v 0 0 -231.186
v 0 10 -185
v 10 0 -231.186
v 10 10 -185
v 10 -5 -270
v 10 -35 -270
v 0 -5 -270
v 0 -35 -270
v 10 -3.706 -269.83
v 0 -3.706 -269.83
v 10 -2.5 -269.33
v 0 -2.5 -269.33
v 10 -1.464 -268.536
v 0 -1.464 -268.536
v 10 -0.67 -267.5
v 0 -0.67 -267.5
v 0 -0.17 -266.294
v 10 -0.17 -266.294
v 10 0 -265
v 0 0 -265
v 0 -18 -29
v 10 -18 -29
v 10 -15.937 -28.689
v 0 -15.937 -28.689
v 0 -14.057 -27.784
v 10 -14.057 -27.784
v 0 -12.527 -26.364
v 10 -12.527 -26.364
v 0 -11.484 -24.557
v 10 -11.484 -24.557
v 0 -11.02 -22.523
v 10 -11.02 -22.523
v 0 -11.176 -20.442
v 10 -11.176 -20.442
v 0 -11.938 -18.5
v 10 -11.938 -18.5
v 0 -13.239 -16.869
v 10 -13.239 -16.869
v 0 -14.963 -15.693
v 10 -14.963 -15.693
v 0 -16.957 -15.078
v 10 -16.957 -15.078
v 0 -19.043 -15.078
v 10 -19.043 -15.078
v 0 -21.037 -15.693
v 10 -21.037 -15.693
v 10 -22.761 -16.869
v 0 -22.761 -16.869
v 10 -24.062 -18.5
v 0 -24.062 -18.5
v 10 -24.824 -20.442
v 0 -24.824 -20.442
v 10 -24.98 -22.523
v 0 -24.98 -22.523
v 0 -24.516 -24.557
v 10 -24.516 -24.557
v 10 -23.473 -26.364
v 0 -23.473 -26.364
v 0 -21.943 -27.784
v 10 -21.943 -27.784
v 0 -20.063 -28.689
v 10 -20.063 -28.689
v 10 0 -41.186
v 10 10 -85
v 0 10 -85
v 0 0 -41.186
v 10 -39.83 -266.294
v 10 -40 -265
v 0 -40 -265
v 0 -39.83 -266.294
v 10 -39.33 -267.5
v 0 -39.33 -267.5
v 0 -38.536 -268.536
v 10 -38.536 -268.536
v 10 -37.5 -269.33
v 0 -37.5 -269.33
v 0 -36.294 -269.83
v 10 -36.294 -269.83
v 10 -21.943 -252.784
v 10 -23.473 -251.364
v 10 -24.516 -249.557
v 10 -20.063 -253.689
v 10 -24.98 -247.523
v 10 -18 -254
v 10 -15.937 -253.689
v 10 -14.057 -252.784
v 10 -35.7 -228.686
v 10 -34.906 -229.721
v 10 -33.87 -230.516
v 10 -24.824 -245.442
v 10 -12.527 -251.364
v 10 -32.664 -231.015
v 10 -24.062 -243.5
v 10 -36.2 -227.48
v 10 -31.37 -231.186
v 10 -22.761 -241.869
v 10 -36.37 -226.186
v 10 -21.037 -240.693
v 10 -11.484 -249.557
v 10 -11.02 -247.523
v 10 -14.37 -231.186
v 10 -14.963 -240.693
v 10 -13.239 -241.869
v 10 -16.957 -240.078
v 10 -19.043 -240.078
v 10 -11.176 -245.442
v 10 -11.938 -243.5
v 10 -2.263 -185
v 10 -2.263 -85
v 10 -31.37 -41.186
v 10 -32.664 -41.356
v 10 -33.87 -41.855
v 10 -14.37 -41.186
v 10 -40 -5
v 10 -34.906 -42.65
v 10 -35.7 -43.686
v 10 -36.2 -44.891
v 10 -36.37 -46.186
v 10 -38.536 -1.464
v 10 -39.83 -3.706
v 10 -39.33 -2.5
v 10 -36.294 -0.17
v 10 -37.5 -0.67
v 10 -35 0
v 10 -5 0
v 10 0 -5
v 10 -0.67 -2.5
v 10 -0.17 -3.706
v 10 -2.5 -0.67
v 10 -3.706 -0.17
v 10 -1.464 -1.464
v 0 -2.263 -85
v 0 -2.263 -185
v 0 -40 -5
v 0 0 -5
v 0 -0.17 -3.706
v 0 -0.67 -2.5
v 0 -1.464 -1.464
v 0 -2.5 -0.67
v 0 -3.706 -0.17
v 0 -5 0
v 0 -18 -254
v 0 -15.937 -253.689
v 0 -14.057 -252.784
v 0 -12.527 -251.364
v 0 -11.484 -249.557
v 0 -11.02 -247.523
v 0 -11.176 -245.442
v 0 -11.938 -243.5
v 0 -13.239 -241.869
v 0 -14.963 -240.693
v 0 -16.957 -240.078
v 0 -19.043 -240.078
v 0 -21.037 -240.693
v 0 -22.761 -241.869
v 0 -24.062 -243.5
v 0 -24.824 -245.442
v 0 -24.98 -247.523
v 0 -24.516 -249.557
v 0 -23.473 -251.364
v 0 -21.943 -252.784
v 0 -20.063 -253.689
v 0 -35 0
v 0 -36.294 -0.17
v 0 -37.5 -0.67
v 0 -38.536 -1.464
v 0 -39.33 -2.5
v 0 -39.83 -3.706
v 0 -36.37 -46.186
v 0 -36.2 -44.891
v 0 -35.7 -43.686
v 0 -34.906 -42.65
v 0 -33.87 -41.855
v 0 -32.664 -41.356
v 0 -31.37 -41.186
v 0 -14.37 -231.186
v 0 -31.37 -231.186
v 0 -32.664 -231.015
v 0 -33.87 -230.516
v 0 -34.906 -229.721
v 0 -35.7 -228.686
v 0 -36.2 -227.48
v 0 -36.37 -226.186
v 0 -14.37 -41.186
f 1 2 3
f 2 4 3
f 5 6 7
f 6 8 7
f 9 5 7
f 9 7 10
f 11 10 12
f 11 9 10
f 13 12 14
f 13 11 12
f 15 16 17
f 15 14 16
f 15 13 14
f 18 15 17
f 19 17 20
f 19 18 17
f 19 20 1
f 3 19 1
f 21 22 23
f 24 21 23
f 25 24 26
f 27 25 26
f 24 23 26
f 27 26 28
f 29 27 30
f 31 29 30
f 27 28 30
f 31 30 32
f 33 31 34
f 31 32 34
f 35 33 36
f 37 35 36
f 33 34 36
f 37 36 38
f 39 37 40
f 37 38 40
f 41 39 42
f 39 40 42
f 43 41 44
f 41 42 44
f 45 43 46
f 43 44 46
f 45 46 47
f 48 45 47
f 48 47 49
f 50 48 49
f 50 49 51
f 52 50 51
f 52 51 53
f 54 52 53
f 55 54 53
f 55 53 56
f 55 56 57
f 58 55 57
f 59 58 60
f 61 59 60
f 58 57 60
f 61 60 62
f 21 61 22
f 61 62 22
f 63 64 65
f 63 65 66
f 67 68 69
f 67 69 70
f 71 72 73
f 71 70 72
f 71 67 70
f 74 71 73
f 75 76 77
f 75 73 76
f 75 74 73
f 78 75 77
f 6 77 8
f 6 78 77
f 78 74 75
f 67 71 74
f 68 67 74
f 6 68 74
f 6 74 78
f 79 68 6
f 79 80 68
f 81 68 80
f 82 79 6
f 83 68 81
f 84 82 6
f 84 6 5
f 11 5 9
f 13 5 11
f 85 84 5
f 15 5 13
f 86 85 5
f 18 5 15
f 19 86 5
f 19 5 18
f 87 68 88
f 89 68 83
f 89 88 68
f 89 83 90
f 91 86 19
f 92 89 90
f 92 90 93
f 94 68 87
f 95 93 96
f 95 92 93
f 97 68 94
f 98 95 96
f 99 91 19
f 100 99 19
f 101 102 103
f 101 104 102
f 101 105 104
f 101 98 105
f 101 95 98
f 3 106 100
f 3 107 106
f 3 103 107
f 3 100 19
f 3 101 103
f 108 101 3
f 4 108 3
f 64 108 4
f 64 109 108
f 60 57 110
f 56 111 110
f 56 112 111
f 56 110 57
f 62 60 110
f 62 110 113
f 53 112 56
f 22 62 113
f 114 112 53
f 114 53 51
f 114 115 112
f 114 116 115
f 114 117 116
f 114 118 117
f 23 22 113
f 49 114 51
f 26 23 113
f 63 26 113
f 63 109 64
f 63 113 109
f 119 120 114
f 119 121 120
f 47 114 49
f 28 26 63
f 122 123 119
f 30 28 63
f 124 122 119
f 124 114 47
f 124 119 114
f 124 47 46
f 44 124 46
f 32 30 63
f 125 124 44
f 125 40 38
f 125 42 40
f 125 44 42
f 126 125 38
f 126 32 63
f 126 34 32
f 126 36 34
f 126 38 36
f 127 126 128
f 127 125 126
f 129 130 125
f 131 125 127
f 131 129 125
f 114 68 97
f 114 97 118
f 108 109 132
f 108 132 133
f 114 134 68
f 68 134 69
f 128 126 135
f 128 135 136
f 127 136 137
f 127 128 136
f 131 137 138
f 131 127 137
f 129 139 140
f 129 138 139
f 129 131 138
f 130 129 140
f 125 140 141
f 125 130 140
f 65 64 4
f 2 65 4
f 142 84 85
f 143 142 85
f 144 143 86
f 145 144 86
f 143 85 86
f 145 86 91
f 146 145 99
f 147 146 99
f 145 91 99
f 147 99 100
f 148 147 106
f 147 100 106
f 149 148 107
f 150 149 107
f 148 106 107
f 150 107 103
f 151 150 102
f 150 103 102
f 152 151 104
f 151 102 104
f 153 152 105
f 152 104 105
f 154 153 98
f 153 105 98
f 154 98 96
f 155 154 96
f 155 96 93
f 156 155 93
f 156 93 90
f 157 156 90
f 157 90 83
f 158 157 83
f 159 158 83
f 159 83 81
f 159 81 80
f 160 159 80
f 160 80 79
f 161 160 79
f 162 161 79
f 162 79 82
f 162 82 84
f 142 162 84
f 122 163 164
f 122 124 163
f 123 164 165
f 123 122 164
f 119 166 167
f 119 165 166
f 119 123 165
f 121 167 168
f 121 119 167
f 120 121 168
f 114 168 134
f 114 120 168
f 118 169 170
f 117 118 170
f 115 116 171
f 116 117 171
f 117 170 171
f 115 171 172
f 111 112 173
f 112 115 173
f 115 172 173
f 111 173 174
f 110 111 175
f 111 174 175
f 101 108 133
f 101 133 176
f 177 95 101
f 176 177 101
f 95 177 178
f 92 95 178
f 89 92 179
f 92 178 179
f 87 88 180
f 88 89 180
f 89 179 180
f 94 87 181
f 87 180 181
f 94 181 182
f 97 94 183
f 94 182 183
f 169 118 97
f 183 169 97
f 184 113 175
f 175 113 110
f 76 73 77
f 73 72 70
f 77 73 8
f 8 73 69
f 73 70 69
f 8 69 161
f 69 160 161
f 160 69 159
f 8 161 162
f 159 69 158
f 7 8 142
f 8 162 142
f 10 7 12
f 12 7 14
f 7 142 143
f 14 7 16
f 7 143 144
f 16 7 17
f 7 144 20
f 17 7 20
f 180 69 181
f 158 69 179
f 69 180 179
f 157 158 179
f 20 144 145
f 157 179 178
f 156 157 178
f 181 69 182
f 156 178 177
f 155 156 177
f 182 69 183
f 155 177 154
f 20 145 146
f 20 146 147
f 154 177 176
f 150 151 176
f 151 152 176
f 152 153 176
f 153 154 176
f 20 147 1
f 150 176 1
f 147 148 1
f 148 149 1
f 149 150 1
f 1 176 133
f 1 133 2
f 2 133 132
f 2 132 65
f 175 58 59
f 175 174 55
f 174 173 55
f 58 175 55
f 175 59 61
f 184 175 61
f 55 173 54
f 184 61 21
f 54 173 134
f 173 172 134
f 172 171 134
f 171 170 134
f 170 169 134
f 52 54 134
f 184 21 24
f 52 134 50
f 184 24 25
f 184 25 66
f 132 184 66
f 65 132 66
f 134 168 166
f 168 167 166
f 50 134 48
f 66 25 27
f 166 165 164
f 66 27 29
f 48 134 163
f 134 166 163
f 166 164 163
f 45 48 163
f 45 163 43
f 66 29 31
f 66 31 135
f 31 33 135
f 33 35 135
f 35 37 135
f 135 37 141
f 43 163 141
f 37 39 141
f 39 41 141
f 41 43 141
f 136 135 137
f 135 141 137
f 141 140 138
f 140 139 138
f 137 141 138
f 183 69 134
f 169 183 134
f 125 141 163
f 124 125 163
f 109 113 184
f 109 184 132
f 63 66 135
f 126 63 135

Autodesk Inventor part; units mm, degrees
ref_plane "YZ Plane" through (0, 0, 0) normal (1, 0, 0) x (0, 1, 0)
ref_plane "XZ Plane" through (0, 0, 0) normal (0, 1, 0) x (-1, 0, 0)
ref_plane "XY Plane" through (0, 0, 0) normal (0, 0, 1) x (1, 0, 0)
sketch "Sketch2" plane through (0, 0, 0) normal (1, 0, 0) x (0, 1, 0)
  line L0 (0, 0) -> (-40, 0)
  line L1 (-40, 0) -> (-40, -270)
  line L2 (-40, -270) -> (0, -270)
  line L3 (0, -270) -> (0, 0)
  dimension "d0" = 40
  dimension "d1" = 270
extrude "Extrusion1" add sketch "Sketch2" along normal blind 10
sketch "Sketch3" plane through (10, 0, 0) normal (1, 0, 0) x (0, 0, -1)
  circle A0 centre (22, -18) radius 7
  line L0 (270, 0) -> (0, 0) projected
  dimension "d4" = 14
  dimension "d10" = 18
extrude "Extrusion2" cut sketch "Sketch3" against normal through all
sketch "Sketch4" plane through (10, 0, 0) normal (1, 0, 0) x (0, 0, -1)
  circle A0 centre (247, -18) radius 7
  line L0 (270, 0) -> (0, 0) projected
  dimension "d7" = 14
  dimension "d11" = 18
extrude "Extrusion3" cut sketch "Sketch4" against normal through all
sketch "Sketch5" plane through (10, 0, 0) normal (1, 0, 0) x (0, 0, -1)
  line L0 (41.1855, -36.3701) -> (231.1855, -36.3701)
  line L1 (231.1855, -36.3701) -> (231.1855, -14.3701)
  line L2 (231.1855, -14.3701) -> (41.1855, -14.3701)
  line L3 (41.1855, -14.3701) -> (41.1855, -36.3701)
  point P0 (0, 0)
  dimension "d14" = 22
  dimension "d15" = 190
extrude "Extrusion4" cut sketch "Sketch5" against normal through all
sketch "Sketch15" plane through (10, 0, 0) normal (1, 0, 0) x (0, 0, -1)
  line L0 (135, 10) -> (85, 10)
  line L1 (85, 10) -> (185, 10)
  line L2 (185, 10) -> (231.1855, 0)
  line L3 (270, 0) -> (0, 0) projected
  line L4 (85, 10) -> (41.1855, 0)
  line L5 (41.1855, -36.3701) -> (41.1855, -14.3701) projected
  line L6 (41.1855, -14.3701) -> (85, 0)
  line L7 (185, 0) -> (231.1855, -12.1069)
  point P0 (41.1855, -30)
  dimension "d37" = 50
  dimension "d38" = 100
extrude "Extrusion10" add sketch "Sketch15" against normal blind 10
sketch "Sketch16" plane through (10, 0, 0) normal (1, 0, 0) x (0, 0, -1)
  line L0 (41.1855, -14.3701) -> (231.1855, -14.3701) projected
  line L1 (41.1855, -14.3701) -> (85, -2.2632)
  line L2 (85, -2.2632) -> (185, -2.2632)
  line L3 (85, 10) -> (185, 10) projected
  line L4 (185, -2.2632) -> (231.1855, -14.3701)
  point P0 (0, 0)
extrude "Extrusion11" cut sketch "Sketch16" against normal through all
fillet "Fillet1" radius 5 6 edges at (5, -40, 0) (5, 0, 0) (5, -40, -270) (5, 0, -270) (5, -36.3701, -231.1855) (5, -36.3701, -41.1855)
properties part number "estructura union gusano"
